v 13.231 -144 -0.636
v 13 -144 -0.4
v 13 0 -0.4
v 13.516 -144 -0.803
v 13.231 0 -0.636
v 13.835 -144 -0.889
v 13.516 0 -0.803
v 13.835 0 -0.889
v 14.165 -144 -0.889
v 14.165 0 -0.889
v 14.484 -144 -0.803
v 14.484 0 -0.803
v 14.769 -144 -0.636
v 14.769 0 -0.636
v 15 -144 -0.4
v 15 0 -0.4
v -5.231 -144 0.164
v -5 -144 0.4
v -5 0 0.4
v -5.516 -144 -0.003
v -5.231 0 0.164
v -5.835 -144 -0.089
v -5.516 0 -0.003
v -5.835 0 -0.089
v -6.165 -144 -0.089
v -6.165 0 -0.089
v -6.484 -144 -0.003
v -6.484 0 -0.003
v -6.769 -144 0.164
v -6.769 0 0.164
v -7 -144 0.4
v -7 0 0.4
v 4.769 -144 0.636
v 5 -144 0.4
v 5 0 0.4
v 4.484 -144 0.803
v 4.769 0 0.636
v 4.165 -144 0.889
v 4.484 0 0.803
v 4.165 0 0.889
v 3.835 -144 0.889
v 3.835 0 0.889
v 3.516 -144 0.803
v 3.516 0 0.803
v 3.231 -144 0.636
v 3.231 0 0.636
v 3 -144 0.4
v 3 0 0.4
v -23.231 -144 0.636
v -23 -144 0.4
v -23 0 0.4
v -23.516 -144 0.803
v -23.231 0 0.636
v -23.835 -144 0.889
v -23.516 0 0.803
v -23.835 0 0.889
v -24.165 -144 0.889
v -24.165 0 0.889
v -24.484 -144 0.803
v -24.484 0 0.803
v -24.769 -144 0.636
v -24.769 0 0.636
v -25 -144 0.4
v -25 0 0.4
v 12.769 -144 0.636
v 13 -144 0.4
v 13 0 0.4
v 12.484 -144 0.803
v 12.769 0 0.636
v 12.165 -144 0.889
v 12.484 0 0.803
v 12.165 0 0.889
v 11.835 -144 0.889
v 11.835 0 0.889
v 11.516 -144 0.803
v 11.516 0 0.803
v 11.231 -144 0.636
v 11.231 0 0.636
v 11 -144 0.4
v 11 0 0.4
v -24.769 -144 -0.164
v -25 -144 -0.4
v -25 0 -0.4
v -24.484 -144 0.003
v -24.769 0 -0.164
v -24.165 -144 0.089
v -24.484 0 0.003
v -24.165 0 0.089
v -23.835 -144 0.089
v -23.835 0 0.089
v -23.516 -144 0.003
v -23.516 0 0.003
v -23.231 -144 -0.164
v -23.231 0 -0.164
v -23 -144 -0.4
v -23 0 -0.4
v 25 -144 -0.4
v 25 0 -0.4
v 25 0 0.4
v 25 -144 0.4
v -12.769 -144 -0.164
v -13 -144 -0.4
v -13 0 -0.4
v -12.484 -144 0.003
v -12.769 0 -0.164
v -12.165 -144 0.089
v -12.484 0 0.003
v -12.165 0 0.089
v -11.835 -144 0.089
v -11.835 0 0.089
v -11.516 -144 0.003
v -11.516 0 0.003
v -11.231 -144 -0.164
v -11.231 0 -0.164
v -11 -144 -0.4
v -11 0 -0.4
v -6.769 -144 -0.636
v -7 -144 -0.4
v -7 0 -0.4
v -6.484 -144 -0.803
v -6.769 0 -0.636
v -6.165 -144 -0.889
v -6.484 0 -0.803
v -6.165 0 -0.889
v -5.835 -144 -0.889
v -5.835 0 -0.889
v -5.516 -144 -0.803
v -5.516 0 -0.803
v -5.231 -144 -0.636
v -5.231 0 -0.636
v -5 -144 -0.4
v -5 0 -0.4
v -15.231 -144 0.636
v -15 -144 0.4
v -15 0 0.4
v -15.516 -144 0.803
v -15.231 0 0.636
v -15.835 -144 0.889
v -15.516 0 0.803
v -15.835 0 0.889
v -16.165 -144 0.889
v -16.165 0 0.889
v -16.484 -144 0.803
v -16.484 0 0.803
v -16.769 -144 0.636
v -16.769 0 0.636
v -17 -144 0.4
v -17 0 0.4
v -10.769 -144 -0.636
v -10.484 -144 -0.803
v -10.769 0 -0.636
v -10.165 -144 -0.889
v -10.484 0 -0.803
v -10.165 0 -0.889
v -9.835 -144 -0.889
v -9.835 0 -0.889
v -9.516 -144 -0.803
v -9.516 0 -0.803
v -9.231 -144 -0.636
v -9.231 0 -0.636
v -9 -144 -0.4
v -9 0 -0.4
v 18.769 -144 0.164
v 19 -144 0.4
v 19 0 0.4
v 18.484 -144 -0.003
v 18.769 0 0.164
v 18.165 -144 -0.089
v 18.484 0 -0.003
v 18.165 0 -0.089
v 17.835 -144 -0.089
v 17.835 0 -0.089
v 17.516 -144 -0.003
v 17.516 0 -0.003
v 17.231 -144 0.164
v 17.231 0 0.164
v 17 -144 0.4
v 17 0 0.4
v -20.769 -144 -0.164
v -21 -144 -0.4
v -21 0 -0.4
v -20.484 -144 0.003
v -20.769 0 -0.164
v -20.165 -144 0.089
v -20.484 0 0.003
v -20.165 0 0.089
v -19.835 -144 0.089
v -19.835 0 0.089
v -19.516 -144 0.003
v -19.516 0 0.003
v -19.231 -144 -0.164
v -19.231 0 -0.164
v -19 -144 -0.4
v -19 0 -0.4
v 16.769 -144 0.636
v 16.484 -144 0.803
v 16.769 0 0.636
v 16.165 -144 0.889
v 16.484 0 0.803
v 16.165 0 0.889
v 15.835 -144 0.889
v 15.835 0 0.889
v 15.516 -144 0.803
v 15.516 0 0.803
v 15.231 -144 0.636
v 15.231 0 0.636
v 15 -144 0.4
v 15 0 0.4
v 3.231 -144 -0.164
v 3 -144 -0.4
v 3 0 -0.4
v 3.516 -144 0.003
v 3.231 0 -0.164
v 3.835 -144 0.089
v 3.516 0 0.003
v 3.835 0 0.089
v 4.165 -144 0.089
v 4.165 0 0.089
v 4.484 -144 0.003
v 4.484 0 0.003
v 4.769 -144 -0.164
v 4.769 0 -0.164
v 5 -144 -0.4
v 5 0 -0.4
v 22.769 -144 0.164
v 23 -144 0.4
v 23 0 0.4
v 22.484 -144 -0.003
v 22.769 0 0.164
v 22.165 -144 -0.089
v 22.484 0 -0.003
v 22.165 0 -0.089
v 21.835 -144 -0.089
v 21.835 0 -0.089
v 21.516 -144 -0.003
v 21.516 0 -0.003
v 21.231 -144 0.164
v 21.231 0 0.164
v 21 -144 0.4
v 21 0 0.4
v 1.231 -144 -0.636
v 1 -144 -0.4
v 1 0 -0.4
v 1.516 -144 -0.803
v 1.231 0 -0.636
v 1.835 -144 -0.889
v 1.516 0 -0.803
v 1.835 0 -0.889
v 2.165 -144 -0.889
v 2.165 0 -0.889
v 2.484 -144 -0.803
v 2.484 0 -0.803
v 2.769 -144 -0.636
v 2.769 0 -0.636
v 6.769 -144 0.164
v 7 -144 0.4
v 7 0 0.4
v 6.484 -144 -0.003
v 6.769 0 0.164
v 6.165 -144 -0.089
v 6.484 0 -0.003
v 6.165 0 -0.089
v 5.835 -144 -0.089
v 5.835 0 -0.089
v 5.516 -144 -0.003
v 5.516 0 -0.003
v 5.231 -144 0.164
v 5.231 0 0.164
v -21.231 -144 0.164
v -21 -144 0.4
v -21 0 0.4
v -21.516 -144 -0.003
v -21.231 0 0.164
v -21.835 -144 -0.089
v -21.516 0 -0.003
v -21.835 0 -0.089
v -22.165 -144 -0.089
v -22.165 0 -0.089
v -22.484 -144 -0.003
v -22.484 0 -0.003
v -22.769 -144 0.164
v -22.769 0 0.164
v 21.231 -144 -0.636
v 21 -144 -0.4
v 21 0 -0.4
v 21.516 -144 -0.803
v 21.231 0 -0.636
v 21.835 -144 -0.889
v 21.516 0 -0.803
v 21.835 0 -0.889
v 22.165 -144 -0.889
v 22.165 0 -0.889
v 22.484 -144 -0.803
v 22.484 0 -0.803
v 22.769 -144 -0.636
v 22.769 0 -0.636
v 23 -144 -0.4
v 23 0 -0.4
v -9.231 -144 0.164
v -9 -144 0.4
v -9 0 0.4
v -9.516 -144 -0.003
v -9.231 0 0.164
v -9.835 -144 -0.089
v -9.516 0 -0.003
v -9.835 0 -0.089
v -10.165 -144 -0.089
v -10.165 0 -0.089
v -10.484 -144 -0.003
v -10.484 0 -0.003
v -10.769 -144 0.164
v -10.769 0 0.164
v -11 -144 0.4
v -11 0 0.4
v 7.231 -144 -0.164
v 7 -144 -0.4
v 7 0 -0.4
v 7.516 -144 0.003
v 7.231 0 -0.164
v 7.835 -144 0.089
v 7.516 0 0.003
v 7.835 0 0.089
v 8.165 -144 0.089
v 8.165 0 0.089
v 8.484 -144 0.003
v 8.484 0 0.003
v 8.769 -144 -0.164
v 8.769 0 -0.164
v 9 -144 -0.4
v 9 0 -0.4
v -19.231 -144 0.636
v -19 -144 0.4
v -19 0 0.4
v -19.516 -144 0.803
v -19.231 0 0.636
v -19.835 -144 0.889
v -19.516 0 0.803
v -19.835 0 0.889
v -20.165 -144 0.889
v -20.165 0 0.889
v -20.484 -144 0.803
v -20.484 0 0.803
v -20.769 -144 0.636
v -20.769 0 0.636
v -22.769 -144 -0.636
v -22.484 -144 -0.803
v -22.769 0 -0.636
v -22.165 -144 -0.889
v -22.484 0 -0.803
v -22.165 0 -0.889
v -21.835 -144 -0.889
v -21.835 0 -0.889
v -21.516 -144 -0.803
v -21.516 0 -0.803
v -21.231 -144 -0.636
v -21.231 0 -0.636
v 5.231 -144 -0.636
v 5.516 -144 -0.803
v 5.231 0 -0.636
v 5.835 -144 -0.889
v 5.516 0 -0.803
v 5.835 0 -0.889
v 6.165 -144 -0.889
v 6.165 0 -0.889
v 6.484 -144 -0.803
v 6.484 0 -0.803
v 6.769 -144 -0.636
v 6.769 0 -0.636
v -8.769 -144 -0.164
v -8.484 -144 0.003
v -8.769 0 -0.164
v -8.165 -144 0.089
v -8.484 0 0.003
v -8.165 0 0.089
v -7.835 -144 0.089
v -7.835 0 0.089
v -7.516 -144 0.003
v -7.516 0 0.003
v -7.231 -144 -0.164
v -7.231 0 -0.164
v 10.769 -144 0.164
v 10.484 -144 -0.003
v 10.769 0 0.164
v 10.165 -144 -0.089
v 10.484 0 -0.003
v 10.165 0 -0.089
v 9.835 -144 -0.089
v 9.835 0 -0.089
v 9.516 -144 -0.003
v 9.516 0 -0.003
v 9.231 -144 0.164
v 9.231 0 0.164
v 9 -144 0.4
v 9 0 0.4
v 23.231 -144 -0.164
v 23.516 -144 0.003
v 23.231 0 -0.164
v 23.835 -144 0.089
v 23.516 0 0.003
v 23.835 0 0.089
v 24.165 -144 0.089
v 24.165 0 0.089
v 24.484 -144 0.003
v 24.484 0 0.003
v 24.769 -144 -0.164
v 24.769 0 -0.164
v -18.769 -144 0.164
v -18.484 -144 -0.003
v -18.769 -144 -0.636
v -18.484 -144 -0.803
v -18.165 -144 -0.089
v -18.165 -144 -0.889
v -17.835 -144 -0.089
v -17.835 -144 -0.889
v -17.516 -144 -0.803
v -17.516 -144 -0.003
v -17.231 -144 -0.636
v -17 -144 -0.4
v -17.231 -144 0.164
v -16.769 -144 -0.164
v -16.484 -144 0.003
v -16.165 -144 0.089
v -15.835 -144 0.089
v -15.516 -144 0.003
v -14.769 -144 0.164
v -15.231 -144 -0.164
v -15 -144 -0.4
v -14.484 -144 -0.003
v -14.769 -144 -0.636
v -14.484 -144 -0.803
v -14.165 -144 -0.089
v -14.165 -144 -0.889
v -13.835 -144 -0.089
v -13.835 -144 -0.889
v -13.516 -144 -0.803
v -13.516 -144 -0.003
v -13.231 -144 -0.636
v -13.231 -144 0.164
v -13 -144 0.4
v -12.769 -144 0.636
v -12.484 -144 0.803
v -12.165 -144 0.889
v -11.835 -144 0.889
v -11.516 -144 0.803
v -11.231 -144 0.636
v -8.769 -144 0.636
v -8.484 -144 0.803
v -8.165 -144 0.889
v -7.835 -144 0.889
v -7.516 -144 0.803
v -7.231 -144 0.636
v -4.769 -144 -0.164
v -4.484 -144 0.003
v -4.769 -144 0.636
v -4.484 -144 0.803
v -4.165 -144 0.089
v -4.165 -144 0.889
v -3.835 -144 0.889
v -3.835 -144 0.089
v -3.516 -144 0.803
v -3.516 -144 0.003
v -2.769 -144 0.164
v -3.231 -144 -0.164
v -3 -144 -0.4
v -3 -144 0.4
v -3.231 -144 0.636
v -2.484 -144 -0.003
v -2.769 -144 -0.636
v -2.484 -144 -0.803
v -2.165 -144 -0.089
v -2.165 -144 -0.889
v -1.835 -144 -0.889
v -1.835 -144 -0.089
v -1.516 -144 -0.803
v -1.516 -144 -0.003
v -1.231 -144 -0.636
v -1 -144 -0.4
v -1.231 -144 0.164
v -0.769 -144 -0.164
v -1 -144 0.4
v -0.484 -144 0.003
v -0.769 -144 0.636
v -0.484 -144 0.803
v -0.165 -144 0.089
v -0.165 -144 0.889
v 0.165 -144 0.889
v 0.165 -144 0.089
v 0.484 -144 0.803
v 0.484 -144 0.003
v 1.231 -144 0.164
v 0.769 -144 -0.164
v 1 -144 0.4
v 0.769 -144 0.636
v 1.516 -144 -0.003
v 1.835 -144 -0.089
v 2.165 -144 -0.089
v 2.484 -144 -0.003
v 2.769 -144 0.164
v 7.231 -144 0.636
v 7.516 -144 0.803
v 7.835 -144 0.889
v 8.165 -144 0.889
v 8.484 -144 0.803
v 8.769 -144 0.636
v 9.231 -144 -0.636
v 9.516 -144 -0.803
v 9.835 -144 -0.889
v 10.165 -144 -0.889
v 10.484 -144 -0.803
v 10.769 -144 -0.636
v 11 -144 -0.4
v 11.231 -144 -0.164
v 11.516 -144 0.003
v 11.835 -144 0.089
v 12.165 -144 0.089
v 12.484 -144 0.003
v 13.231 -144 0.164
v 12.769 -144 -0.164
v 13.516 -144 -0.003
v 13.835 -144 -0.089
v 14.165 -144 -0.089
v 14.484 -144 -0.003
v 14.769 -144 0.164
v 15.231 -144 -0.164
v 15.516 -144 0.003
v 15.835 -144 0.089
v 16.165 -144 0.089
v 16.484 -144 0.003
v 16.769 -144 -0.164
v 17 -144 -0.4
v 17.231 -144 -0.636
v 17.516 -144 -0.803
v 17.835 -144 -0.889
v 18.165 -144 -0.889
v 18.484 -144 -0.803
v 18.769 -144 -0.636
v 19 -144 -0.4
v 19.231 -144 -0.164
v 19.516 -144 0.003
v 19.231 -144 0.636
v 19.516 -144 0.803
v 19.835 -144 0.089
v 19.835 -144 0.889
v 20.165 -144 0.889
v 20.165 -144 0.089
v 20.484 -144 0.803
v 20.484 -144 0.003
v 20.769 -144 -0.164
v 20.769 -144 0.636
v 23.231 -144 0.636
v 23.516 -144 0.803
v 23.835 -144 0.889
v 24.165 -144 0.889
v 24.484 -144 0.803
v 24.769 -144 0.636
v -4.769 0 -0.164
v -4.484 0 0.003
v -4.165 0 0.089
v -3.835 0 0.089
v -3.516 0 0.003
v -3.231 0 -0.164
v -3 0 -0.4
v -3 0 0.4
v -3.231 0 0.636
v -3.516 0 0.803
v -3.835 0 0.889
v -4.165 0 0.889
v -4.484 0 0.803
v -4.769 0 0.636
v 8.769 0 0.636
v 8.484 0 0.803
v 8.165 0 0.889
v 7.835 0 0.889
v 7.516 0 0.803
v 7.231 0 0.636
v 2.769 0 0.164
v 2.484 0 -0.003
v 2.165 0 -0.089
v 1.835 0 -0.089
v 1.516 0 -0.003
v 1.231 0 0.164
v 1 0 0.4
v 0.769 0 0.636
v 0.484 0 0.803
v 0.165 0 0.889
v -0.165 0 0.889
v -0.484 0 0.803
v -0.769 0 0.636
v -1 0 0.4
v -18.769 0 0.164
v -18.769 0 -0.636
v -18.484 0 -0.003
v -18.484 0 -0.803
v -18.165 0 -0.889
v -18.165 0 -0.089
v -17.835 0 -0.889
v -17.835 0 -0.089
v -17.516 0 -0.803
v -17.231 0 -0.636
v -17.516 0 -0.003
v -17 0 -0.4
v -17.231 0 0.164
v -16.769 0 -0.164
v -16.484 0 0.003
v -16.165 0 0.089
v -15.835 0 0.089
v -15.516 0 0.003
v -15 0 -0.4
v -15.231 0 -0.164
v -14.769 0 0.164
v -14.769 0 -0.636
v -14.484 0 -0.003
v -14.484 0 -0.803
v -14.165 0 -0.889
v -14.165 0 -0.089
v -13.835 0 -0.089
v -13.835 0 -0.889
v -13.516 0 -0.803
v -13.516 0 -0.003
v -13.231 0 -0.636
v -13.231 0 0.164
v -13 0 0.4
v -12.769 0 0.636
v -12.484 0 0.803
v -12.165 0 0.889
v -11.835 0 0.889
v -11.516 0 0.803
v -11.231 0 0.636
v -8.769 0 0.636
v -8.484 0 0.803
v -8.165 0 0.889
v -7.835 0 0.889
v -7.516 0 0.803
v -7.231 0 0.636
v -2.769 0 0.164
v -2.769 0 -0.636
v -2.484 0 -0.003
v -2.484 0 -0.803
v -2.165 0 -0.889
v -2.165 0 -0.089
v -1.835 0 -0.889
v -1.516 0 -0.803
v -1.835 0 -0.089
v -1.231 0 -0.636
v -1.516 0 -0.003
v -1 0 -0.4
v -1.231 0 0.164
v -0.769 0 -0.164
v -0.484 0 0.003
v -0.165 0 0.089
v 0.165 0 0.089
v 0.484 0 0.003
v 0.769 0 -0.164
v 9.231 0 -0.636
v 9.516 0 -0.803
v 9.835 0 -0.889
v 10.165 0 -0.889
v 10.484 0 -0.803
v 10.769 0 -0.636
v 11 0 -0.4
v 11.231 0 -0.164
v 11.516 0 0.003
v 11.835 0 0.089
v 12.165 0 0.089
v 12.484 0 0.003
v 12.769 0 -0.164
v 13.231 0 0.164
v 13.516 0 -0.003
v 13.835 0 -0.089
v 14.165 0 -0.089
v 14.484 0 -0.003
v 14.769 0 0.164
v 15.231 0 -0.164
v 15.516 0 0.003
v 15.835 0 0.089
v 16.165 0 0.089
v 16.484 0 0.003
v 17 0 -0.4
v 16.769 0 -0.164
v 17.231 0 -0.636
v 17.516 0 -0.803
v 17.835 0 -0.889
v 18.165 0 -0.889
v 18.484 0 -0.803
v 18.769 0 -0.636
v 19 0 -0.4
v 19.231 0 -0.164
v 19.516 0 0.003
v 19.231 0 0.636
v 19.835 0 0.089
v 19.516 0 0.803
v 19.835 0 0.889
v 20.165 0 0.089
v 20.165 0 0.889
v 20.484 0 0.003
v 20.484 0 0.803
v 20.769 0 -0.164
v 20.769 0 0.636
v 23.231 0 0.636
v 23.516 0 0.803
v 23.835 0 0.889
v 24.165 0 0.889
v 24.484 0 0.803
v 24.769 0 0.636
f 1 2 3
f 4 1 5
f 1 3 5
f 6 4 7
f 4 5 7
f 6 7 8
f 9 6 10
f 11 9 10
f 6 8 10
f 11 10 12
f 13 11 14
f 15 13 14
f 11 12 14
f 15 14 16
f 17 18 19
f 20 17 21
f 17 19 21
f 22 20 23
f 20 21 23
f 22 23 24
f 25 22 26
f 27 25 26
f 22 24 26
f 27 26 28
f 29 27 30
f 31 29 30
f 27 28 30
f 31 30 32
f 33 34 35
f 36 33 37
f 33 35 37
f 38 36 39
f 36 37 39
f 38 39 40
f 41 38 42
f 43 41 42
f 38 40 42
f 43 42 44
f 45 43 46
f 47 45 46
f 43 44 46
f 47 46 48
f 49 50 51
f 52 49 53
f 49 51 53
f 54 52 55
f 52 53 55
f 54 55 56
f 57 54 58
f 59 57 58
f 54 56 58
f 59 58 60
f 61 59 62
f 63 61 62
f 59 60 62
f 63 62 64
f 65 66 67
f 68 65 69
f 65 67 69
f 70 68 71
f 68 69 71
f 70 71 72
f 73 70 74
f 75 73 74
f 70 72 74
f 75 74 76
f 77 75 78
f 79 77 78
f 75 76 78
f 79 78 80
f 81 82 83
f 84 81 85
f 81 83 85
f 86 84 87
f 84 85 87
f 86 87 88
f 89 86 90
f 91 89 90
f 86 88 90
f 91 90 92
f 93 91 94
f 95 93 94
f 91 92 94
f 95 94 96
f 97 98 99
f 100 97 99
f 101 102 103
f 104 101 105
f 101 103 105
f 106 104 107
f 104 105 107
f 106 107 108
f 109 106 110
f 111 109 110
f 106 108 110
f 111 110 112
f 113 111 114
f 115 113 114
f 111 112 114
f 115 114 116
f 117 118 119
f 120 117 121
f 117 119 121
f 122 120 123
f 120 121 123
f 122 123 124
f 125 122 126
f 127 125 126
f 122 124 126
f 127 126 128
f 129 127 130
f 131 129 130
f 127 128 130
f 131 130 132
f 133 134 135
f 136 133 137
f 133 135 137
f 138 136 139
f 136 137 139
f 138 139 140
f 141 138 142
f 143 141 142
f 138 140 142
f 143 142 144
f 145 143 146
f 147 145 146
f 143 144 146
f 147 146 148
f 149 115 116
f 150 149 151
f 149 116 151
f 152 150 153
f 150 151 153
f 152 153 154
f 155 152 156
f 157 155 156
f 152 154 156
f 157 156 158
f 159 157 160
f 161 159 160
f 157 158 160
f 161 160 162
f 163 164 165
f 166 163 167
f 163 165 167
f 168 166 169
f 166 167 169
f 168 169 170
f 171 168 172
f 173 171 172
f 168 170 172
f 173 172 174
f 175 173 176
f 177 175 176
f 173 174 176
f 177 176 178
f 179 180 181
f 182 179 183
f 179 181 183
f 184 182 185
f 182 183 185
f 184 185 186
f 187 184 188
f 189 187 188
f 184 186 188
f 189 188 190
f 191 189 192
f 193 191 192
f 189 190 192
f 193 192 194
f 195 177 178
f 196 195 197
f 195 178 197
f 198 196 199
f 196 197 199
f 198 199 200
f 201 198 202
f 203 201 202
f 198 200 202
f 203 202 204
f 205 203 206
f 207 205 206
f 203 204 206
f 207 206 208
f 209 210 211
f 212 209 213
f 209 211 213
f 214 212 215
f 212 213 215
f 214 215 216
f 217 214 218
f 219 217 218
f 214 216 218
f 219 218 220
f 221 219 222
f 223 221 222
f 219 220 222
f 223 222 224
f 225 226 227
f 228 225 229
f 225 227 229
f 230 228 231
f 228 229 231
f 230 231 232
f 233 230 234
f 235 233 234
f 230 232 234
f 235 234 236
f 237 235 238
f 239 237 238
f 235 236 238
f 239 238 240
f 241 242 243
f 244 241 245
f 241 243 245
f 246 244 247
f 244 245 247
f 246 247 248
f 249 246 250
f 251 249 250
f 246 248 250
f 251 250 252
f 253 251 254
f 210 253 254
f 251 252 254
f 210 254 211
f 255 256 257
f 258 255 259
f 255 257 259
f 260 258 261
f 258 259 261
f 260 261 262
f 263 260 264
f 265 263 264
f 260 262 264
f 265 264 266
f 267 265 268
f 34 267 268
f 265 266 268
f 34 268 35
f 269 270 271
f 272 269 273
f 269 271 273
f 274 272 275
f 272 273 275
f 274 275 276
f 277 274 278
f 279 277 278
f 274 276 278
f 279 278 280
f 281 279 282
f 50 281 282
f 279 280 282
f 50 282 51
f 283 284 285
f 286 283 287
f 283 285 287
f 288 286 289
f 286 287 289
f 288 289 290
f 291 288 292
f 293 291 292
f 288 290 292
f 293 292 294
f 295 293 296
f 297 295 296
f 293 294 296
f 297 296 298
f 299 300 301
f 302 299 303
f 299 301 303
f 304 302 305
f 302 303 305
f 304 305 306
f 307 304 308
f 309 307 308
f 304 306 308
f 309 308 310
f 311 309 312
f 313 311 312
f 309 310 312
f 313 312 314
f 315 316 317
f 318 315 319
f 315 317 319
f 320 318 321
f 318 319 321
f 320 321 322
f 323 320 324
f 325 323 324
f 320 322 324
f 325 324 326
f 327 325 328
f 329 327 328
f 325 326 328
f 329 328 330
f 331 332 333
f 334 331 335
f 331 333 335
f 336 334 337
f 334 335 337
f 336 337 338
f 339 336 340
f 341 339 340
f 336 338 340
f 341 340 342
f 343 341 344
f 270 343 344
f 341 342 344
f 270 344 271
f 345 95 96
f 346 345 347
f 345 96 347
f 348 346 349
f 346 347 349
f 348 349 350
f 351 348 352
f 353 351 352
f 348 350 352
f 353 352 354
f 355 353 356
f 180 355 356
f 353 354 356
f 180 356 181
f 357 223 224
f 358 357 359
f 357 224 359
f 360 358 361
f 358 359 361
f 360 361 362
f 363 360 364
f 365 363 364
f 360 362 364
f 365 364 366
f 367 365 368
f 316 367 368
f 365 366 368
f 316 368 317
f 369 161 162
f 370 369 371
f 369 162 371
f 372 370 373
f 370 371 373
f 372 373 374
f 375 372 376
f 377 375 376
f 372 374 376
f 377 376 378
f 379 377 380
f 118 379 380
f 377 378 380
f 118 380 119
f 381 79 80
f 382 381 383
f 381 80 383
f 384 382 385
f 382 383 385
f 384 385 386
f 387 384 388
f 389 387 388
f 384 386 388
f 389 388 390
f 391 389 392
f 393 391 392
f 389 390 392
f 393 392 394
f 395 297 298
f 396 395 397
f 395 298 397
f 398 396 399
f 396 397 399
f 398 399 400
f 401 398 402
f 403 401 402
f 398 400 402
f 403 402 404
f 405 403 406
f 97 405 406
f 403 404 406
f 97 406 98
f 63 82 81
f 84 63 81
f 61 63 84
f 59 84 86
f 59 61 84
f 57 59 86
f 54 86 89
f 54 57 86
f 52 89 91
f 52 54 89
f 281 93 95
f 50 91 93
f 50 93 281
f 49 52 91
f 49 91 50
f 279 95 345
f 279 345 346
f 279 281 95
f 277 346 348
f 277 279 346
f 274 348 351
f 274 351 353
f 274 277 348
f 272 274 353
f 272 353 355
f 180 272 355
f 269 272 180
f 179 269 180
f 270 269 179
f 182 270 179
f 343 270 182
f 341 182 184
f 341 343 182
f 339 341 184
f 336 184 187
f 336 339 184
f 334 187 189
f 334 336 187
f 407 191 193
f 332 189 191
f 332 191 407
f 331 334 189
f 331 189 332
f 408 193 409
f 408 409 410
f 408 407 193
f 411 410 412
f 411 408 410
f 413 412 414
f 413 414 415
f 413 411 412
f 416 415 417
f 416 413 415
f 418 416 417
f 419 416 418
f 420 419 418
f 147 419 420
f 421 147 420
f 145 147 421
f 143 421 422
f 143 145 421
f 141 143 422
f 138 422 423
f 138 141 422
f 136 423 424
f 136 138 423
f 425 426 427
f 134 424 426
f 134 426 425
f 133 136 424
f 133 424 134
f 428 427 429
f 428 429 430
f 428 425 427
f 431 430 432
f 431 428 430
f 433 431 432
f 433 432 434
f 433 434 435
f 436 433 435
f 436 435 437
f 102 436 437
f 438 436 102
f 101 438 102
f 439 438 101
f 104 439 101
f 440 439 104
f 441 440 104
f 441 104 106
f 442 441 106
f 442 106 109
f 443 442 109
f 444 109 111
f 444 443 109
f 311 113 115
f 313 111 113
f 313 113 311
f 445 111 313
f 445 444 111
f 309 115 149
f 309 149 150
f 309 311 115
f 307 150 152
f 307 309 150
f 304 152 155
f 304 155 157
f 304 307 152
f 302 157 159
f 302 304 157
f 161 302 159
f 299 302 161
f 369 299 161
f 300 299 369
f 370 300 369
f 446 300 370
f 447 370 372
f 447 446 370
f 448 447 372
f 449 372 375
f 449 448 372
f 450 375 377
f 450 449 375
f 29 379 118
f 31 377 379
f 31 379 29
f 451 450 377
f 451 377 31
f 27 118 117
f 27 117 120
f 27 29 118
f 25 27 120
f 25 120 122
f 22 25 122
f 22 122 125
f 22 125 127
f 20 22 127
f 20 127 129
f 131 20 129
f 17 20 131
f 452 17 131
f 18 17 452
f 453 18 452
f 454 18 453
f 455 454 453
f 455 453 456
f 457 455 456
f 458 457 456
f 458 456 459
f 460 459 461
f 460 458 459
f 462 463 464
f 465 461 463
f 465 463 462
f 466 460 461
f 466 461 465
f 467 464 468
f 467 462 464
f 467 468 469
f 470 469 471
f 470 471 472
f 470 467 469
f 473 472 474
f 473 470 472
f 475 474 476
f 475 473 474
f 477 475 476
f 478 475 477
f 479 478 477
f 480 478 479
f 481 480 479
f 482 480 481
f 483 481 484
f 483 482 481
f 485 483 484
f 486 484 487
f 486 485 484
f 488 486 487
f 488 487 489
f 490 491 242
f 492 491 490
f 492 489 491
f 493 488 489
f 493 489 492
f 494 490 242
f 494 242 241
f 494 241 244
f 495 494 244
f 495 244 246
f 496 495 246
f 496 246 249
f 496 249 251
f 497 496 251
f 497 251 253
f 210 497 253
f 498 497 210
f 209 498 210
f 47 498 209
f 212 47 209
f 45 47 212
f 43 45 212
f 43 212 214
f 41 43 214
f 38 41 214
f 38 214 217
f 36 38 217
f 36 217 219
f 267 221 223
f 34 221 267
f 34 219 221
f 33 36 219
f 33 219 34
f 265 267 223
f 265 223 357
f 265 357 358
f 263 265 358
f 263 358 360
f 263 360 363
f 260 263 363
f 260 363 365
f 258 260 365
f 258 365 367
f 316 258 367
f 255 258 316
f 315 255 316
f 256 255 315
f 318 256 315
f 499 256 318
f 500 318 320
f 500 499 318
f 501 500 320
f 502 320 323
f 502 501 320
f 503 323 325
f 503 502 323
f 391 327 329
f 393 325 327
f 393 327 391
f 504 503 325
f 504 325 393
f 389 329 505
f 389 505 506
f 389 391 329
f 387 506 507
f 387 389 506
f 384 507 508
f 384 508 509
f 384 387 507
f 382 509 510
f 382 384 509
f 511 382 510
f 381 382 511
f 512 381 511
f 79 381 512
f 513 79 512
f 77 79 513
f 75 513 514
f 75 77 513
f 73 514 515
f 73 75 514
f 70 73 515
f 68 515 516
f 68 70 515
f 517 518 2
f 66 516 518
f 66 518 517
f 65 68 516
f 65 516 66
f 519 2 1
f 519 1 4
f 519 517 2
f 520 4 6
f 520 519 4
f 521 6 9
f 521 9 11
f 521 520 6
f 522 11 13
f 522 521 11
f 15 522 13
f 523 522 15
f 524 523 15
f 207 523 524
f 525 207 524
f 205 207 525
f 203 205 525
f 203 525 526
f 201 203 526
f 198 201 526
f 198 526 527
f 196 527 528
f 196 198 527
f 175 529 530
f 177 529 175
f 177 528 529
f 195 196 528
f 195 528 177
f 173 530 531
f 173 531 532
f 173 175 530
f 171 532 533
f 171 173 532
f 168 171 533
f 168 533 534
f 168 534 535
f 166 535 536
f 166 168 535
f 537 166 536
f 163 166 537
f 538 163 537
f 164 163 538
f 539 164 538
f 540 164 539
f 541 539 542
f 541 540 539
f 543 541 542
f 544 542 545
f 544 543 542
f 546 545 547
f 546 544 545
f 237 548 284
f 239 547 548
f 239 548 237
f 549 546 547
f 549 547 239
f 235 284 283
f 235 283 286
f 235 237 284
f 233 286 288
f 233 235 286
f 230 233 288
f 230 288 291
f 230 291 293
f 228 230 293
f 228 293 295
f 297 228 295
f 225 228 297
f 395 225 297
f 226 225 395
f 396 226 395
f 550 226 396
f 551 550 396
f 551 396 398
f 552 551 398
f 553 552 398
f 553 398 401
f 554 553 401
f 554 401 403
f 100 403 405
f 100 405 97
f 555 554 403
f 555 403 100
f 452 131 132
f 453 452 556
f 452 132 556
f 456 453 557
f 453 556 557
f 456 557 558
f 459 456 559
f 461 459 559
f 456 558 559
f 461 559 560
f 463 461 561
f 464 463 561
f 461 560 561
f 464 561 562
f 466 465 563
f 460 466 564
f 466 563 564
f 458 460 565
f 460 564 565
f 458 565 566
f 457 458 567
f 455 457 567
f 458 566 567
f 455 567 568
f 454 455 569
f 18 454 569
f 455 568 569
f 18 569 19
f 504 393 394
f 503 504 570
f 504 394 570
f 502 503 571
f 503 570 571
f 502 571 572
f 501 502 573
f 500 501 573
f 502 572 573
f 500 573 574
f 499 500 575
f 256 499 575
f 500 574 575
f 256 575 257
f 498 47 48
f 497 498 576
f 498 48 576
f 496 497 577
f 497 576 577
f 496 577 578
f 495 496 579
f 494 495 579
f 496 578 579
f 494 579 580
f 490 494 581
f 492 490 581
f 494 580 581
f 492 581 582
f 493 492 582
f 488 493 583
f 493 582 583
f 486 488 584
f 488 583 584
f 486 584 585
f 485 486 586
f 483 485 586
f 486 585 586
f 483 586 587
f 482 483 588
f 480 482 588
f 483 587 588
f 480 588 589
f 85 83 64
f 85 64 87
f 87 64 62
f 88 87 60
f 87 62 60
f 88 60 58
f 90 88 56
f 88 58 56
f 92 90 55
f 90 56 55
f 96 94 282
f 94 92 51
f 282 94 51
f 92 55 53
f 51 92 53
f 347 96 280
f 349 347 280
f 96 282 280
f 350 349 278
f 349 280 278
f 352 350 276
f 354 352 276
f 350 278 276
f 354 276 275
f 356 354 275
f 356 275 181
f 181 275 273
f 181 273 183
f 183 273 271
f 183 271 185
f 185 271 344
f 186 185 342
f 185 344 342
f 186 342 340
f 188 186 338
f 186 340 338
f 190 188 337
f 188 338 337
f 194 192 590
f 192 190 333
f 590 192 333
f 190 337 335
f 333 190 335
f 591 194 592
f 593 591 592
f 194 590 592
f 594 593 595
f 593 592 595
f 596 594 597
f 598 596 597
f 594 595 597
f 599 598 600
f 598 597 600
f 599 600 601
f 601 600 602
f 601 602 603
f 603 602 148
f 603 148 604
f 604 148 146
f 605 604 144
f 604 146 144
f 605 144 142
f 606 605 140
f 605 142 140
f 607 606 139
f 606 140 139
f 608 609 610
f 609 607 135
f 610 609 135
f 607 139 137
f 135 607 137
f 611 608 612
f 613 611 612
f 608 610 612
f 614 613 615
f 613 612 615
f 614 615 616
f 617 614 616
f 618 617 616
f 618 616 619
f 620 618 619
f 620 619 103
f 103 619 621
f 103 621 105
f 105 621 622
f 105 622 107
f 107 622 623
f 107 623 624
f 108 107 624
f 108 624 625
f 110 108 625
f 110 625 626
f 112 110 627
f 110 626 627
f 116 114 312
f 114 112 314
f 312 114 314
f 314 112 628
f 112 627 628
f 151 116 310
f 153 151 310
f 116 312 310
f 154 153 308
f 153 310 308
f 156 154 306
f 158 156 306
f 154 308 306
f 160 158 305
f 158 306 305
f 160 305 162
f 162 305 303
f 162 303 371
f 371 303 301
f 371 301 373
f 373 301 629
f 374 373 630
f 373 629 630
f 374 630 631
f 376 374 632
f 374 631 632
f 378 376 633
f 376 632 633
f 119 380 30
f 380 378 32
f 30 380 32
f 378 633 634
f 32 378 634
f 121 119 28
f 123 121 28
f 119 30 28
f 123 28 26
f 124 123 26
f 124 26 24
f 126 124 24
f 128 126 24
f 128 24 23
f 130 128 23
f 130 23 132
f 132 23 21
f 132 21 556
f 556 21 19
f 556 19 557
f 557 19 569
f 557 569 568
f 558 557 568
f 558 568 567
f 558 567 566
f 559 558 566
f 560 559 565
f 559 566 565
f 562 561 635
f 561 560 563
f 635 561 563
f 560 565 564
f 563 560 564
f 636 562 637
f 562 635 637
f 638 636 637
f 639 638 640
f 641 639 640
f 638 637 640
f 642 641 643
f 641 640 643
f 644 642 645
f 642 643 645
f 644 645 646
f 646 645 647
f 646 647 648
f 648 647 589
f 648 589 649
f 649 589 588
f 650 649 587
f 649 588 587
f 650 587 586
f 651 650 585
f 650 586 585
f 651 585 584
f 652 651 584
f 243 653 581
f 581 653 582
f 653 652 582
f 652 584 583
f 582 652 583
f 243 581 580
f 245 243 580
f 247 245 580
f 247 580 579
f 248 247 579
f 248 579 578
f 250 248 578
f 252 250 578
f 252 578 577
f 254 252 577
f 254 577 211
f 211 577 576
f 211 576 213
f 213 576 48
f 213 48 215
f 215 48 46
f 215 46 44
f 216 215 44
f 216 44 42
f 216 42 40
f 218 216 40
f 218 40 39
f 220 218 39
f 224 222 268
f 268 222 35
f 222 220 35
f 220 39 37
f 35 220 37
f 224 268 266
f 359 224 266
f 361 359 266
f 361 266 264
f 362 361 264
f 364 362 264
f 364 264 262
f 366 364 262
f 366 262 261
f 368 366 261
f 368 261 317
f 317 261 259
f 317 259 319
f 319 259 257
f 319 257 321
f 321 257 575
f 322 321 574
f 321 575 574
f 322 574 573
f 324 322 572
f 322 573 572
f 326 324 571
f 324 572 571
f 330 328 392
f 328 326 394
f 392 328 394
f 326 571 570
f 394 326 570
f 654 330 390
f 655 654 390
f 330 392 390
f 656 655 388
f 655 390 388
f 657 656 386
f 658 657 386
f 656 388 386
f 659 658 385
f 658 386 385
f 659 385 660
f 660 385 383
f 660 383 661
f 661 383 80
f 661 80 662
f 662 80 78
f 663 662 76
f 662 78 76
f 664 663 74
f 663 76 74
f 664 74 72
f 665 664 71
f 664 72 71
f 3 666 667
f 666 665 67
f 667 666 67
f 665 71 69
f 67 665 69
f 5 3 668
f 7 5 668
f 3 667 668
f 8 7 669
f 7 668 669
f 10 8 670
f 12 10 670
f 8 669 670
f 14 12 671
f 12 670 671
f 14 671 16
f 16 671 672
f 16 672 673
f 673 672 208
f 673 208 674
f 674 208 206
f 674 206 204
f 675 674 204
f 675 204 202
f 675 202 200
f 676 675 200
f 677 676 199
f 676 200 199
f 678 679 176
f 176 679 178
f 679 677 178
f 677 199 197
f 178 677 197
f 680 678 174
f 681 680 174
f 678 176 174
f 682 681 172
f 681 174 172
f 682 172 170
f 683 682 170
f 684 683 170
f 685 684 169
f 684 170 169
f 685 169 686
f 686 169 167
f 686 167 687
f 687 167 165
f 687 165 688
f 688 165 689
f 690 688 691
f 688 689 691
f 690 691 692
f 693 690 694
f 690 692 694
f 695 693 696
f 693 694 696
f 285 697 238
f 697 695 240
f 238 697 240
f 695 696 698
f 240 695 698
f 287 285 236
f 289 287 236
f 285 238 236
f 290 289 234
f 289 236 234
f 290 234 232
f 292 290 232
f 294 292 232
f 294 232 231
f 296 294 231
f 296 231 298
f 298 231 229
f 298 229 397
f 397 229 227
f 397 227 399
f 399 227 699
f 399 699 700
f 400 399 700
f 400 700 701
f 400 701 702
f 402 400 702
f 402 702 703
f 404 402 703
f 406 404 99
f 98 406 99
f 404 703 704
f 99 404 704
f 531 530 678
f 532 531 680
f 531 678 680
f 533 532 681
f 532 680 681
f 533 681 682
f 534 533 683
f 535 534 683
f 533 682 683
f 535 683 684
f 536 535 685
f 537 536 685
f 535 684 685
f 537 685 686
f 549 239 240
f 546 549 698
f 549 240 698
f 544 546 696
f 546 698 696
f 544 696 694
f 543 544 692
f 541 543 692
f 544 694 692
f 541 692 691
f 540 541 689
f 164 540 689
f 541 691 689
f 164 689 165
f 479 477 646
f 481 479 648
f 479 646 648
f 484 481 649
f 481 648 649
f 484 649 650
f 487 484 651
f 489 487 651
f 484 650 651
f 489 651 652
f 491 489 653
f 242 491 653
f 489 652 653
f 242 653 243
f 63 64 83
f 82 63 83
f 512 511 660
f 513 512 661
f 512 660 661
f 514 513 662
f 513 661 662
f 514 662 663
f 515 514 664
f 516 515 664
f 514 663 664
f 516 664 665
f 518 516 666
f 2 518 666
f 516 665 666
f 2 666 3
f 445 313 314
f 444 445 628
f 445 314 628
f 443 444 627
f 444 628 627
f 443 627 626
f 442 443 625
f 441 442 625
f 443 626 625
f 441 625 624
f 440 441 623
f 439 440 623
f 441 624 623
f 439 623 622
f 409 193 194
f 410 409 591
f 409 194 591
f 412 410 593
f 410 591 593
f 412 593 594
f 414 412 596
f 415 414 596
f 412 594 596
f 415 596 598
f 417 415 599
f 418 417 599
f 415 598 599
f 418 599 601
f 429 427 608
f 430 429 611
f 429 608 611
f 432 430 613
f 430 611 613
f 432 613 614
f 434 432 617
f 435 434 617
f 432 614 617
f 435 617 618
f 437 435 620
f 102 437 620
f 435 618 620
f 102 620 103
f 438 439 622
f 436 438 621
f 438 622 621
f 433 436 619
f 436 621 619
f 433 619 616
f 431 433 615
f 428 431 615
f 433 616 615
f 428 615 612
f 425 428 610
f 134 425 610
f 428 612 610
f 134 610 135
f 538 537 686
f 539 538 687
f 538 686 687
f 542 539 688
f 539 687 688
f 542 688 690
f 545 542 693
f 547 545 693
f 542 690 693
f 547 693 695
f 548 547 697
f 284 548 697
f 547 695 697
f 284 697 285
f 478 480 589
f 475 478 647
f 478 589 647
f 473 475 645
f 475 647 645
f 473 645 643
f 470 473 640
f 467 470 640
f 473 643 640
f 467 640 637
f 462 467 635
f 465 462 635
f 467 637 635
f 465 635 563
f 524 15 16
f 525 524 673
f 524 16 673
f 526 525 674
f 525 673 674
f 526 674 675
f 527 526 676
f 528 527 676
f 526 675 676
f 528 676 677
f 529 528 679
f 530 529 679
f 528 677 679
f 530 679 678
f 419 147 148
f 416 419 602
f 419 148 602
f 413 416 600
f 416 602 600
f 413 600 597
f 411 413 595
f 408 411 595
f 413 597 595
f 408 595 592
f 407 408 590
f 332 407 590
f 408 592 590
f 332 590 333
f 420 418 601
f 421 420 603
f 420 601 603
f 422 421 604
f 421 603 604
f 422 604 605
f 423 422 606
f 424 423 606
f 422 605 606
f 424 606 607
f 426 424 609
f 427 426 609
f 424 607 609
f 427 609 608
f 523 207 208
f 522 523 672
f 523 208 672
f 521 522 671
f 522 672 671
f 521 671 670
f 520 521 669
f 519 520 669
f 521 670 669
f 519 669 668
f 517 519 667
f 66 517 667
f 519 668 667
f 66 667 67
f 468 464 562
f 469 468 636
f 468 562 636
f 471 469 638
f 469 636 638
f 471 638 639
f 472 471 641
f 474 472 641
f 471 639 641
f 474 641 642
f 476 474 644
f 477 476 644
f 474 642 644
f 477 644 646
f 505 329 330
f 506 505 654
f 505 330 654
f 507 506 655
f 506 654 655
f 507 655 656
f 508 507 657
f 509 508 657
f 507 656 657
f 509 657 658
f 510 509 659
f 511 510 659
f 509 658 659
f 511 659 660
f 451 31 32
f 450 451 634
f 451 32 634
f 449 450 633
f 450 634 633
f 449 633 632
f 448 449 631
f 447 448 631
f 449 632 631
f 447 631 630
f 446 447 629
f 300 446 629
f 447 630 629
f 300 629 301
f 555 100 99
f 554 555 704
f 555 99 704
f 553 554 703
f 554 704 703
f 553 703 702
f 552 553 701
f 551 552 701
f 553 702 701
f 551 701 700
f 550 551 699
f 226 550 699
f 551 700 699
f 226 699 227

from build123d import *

# Parameters (mm, degrees)
F1_DEPTH = 144


with BuildPart() as f1:
    # F0 (on Front) → F1 (new body)
    with BuildSketch(Plane.XZ):
        with BuildLine():
            ThreePointArc((-21, -0.4), (-20, 0.1), (-19, -0.4))
            ThreePointArc((-19, -0.4), (-18, -0.9), (-17, -0.4))
            ThreePointArc((-17, -0.4), (-16, 0.1), (-15, -0.4))
            ThreePointArc((-15, -0.4), (-14, -0.9), (-13, -0.4))
            ThreePointArc((-13, -0.4), (-12, 0.1), (-11, -0.4))
            ThreePointArc((-11, -0.4), (-10, -0.9), (-9, -0.4))
            ThreePointArc((-9, -0.4), (-8, 0.1), (-7, -0.4))
            ThreePointArc((-7, -0.4), (-6, -0.9), (-5, -0.4))
            ThreePointArc((-5, -0.4), (-4, 0.1), (-3, -0.4))
            ThreePointArc((-3, -0.4), (-2, -0.9), (-1, -0.4))
            ThreePointArc((-1, -0.4), (0, 0.1), (1, -0.4))
            ThreePointArc((1, -0.4), (2, -0.9), (3, -0.4))
            ThreePointArc((3, -0.4), (4, 0.1), (5, -0.4))
            ThreePointArc((5, -0.4), (6, -0.9), (7, -0.4))
            ThreePointArc((7, -0.4), (8, 0.1), (9, -0.4))
            ThreePointArc((9, -0.4), (10, -0.9), (11, -0.4))
            ThreePointArc((11, -0.4), (12, 0.1), (13, -0.4))
            ThreePointArc((13, -0.4), (14, -0.9), (15, -0.4))
            ThreePointArc((15, -0.4), (16, 0.1), (17, -0.4))
            ThreePointArc((17, -0.4), (18, -0.9), (19, -0.4))
            ThreePointArc((19, -0.4), (20, 0.1), (21, -0.4))
            ThreePointArc((21, -0.4), (22, -0.9), (23, -0.4))
            ThreePointArc((23, -0.4), (24, 0.1), (25, -0.4))
            Line((25, -0.4), (25, 0.4))
            ThreePointArc((25, 0.4), (24, 0.9), (23, 0.4))
            ThreePointArc((23, 0.4), (22, -0.1), (21, 0.4))
            ThreePointArc((21, 0.4), (20, 0.9), (19, 0.4))
            ThreePointArc((19, 0.4), (18, -0.1), (17, 0.4))
            ThreePointArc((17, 0.4), (16, 0.9), (15, 0.4))
            ThreePointArc((15, 0.4), (14, -0.1), (13, 0.4))
            ThreePointArc((13, 0.4), (12, 0.9), (11, 0.4))
            ThreePointArc((11, 0.4), (10, -0.1), (9, 0.4))
            ThreePointArc((9, 0.4), (8, 0.9), (7, 0.4))
            ThreePointArc((7, 0.4), (6, -0.1), (5, 0.4))
            ThreePointArc((5, 0.4), (4, 0.9), (3, 0.4))
            ThreePointArc((3, 0.4), (2, -0.1), (1, 0.4))
            ThreePointArc((1, 0.4), (0, 0.9), (-1, 0.4))
            ThreePointArc((-1, 0.4), (-2, -0.1), (-3, 0.4))
            ThreePointArc((-3, 0.4), (-4, 0.9), (-5, 0.4))
            ThreePointArc((-5, 0.4), (-6, -0.1), (-7, 0.4))
            ThreePointArc((-7, 0.4), (-8, 0.9), (-9, 0.4))
            ThreePointArc((-9, 0.4), (-10, -0.1), (-11, 0.4))
            ThreePointArc((-11, 0.4), (-12, 0.9), (-13, 0.4))
            ThreePointArc((-13, 0.4), (-14, -0.1), (-15, 0.4))
            ThreePointArc((-15, 0.4), (-16, 0.9), (-17, 0.4))
            ThreePointArc((-17, 0.4), (-18, -0.1), (-19, 0.4))
            ThreePointArc((-19, 0.4), (-20, 0.9), (-21, 0.4))
            ThreePointArc((-21, 0.4), (-22, -0.1), (-23, 0.4))
            ThreePointArc((-23, 0.4), (-24, 0.9), (-25, 0.4))
            Line((-25, 0.4), (-25, -0.4))
            ThreePointArc((-25, -0.4), (-24, 0.1), (-23, -0.4))
            ThreePointArc((-23, -0.4), (-22, -0.9), (-21, -0.4))
        make_face()
    extrude(amount=F1_DEPTH)


solid = f1.part
